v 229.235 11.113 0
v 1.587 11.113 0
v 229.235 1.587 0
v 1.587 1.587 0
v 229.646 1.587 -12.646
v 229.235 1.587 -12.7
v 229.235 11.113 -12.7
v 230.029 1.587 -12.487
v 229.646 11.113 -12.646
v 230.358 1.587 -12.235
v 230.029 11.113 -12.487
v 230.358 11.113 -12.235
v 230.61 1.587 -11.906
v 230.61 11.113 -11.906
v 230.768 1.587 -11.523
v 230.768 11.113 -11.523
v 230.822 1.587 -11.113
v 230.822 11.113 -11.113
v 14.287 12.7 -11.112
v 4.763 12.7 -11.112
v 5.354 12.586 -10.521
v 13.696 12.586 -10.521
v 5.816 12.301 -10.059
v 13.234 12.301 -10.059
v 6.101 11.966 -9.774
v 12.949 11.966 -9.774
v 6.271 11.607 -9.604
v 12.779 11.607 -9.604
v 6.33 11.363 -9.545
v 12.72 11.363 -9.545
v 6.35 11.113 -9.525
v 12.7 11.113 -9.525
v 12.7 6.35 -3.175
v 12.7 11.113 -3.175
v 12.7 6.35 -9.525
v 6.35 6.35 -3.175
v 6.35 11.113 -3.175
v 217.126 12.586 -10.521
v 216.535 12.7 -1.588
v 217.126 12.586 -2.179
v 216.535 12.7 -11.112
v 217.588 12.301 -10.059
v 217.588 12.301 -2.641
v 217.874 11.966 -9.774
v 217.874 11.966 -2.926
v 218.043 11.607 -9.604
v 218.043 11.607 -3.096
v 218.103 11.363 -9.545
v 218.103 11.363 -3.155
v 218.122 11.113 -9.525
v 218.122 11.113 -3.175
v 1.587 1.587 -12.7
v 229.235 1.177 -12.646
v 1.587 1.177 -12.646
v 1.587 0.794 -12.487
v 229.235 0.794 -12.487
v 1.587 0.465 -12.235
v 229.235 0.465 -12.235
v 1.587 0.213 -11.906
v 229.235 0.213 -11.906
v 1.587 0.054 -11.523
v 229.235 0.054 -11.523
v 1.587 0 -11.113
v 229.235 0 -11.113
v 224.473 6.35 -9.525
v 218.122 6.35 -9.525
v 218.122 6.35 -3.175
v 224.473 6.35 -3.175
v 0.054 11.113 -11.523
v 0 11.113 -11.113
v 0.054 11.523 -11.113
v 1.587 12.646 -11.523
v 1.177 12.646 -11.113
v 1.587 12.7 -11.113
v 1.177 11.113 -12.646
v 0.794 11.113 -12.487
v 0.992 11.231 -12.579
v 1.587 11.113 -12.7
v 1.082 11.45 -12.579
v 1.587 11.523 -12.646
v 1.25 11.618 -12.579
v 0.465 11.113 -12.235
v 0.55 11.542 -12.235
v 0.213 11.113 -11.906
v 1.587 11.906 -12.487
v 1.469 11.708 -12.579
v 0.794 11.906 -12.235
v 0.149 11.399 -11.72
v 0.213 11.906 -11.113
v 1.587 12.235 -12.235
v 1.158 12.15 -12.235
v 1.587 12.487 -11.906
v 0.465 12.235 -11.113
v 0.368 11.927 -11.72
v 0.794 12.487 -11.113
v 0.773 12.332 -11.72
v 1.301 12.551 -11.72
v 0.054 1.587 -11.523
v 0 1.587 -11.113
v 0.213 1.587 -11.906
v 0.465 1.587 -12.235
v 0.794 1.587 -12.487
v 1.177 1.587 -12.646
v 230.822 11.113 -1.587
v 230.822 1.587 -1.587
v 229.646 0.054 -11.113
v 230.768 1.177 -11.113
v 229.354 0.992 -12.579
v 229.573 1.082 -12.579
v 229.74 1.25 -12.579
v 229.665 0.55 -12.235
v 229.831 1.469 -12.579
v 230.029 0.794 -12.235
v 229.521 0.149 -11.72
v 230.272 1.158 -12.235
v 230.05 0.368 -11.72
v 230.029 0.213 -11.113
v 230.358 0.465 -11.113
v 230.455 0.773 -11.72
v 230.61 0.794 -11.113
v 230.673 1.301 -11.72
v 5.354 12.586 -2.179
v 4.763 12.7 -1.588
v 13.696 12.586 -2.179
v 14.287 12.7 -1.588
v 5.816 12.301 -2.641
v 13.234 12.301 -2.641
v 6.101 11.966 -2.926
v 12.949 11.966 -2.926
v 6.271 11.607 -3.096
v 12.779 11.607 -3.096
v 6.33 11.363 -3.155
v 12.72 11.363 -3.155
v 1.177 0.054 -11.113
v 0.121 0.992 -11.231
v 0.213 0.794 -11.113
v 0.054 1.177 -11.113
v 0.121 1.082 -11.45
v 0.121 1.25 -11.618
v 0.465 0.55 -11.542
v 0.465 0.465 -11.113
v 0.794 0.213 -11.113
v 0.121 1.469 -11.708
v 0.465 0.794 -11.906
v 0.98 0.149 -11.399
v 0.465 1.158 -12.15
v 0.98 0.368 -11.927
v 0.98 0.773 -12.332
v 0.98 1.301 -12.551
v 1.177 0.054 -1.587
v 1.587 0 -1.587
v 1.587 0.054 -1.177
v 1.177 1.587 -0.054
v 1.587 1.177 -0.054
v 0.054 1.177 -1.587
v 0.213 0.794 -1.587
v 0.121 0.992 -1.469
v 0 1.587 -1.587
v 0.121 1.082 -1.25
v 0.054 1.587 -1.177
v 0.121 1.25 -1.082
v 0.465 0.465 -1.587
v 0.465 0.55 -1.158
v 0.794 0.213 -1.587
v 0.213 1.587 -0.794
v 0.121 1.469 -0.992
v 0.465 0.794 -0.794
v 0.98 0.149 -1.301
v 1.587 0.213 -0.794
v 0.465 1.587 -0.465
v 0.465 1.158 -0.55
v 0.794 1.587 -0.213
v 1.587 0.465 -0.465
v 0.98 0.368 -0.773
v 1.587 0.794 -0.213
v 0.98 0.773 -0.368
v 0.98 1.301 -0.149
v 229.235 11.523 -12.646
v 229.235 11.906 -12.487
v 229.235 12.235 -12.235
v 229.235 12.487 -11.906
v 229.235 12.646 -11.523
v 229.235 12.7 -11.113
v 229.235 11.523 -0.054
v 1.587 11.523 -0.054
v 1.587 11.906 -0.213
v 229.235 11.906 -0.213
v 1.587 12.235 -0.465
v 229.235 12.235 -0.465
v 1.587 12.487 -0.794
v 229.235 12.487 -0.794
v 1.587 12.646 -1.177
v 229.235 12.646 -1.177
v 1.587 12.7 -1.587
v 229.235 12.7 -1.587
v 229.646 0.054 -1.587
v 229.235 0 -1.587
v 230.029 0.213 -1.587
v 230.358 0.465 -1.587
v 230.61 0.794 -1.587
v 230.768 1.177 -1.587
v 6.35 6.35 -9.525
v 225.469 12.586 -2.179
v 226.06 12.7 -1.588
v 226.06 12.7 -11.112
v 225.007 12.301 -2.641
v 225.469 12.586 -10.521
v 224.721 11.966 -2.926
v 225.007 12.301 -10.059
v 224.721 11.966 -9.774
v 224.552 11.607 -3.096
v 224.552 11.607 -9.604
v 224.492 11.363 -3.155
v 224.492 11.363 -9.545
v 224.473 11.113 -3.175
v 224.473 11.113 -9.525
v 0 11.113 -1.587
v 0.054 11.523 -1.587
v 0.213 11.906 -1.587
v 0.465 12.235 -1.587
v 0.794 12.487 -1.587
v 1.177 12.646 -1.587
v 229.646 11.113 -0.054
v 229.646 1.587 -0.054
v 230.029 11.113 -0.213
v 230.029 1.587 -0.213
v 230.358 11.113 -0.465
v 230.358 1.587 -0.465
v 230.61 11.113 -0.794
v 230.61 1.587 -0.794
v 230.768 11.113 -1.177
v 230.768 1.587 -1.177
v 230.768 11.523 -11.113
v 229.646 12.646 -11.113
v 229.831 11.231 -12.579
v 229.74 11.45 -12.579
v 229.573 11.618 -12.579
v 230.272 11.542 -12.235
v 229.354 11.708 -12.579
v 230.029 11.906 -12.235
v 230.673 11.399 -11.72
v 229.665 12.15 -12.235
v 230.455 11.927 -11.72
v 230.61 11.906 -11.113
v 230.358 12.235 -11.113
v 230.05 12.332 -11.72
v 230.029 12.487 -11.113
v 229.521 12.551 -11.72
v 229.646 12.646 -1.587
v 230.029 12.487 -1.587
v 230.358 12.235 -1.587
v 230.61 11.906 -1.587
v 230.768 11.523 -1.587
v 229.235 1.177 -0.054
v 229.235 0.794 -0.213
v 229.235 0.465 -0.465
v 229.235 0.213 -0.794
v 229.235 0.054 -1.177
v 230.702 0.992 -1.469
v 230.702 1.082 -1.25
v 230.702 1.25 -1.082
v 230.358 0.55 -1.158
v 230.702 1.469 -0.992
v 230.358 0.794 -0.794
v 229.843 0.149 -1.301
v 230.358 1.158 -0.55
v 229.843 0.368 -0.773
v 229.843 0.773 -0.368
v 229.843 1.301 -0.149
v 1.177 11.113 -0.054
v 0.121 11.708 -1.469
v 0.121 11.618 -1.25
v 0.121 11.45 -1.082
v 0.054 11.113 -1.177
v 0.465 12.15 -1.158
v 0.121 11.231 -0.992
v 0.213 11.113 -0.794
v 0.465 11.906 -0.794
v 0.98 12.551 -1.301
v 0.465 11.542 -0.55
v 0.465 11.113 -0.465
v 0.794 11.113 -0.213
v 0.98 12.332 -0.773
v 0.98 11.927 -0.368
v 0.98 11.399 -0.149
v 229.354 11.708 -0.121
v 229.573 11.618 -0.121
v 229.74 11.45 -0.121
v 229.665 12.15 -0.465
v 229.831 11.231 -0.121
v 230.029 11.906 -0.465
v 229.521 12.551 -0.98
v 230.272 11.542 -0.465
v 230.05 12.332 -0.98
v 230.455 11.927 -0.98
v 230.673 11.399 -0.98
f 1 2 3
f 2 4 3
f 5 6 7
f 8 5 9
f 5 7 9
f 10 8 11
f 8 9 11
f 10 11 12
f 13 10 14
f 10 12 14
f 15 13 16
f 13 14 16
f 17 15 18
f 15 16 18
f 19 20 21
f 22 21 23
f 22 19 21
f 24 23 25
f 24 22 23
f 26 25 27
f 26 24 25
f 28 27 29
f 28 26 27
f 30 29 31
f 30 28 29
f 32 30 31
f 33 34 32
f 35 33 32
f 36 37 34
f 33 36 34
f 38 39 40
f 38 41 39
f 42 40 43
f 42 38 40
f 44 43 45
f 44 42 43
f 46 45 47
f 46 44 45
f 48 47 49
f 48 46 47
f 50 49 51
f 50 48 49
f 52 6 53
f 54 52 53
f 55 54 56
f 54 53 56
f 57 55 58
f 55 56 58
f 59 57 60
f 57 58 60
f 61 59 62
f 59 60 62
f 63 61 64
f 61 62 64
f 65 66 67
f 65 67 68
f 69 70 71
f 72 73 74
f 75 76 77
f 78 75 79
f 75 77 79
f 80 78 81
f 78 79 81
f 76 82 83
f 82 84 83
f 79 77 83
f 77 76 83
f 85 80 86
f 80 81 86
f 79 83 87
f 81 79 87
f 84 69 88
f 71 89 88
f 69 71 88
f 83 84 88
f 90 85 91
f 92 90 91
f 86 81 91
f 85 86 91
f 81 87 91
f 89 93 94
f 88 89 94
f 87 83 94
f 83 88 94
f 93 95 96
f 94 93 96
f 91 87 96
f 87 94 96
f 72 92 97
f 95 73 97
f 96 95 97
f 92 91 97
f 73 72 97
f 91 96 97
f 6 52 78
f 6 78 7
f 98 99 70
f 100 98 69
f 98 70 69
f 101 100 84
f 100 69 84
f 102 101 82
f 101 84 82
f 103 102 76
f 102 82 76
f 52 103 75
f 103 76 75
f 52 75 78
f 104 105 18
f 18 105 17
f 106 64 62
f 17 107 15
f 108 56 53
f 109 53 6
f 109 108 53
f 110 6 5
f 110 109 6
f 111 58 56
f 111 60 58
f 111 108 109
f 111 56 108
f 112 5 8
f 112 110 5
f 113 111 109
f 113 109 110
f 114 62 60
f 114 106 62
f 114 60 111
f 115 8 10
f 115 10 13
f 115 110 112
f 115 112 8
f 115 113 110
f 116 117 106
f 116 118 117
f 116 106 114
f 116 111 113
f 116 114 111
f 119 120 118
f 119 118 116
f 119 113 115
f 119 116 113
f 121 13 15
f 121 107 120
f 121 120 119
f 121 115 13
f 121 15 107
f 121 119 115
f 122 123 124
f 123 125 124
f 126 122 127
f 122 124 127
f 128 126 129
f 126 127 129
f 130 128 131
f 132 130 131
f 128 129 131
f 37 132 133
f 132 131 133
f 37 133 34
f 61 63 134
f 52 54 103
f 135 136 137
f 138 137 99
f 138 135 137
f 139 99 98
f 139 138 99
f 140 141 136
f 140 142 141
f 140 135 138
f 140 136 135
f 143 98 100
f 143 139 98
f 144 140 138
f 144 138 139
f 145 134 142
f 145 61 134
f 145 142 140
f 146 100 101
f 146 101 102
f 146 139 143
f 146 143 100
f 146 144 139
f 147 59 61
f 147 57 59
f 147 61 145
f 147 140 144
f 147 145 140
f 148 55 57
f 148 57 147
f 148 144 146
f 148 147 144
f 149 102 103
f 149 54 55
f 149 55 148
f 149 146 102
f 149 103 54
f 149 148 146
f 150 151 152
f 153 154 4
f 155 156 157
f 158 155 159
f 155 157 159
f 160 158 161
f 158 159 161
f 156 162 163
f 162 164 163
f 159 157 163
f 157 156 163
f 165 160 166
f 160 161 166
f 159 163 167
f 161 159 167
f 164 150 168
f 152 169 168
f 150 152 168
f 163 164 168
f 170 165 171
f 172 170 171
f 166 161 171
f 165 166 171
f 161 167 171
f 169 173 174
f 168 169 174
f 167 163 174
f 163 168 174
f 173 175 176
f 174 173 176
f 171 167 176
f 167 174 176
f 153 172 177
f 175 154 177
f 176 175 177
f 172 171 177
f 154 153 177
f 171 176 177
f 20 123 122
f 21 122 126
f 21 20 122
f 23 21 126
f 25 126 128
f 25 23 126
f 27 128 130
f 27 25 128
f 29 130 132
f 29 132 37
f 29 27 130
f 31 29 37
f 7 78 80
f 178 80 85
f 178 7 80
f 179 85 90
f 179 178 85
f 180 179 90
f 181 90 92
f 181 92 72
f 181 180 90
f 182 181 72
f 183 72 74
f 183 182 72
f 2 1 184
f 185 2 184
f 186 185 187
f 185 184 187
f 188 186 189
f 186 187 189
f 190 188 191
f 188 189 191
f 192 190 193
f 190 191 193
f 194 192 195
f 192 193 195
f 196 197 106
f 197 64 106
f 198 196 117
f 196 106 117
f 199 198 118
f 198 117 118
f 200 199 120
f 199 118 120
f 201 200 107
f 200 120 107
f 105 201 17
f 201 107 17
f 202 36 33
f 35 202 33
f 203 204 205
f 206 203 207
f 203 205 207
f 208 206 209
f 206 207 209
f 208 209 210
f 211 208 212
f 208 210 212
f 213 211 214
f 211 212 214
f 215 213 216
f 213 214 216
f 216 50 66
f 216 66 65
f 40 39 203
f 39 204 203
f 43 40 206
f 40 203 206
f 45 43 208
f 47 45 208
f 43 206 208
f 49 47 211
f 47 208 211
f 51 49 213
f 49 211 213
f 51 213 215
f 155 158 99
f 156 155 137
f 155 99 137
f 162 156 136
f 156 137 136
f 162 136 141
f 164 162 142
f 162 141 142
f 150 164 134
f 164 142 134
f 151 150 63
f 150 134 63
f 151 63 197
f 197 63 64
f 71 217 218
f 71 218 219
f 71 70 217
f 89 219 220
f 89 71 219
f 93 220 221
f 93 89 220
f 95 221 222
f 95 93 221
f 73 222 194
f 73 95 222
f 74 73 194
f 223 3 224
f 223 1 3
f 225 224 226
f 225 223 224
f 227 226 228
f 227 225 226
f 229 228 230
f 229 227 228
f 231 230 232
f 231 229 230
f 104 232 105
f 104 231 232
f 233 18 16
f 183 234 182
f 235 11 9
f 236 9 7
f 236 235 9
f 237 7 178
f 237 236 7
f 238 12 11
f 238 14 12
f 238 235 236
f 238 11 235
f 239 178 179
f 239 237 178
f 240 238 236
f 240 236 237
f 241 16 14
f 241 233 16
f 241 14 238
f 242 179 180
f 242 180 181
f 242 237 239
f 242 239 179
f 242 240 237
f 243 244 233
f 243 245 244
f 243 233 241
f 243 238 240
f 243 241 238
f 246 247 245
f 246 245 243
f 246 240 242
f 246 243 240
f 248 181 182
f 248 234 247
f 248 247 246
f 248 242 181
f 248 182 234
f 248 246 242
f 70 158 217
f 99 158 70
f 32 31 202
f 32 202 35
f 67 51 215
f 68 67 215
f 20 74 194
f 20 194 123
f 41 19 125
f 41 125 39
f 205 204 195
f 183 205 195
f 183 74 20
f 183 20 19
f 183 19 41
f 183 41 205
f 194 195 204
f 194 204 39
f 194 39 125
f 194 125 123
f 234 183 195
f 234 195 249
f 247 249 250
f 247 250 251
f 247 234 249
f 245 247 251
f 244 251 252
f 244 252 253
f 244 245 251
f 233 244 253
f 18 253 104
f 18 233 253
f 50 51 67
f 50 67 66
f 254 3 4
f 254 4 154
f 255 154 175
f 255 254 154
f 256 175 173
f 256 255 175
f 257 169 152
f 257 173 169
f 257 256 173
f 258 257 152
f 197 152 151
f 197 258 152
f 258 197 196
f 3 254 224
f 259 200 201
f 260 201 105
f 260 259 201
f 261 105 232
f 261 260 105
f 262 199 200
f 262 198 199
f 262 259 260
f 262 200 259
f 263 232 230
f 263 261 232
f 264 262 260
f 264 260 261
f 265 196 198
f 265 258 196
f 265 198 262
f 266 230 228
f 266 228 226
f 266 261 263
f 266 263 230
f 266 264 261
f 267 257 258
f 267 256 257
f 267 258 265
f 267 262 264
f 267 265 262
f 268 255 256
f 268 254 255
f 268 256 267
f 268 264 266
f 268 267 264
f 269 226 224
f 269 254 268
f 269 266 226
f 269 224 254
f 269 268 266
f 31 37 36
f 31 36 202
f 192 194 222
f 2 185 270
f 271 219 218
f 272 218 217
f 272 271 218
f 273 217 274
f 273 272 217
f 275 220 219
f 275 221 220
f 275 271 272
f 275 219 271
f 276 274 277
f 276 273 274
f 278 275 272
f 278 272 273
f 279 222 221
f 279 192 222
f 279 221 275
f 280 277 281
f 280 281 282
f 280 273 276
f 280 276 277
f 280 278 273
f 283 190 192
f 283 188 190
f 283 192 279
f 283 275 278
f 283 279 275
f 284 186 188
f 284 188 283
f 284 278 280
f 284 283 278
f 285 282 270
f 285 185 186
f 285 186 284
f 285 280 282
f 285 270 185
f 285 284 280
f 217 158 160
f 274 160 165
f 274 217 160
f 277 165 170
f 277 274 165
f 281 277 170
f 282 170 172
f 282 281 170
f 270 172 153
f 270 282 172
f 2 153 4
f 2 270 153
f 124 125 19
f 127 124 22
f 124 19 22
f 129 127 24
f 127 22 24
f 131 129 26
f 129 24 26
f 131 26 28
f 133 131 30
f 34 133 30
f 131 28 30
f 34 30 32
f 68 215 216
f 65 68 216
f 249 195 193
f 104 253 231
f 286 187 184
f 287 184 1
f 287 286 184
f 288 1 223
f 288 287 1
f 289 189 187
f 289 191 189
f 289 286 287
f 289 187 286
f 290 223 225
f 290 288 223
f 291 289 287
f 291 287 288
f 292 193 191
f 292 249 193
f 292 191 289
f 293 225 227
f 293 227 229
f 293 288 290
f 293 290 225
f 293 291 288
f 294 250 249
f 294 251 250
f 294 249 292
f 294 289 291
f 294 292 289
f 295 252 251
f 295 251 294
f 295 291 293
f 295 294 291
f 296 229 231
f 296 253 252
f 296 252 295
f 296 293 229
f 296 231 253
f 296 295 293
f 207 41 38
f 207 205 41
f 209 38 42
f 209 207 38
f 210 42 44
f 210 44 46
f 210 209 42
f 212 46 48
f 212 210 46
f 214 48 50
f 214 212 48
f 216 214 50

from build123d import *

# Parameters (mm, degrees)
SKETCH1_W           = 230.8225
SKETCH1_H           = 12.7
BOSS_EXTRUDE1_DEPTH = 12.7
SKETCH2_W           = 6.35
SKETCH2_H           = 6.35
CUT_EXTRUDE1_DEPTH  = 6.35
FILLET1_R           = 1.5875


with BuildPart() as part:
    # Sketch1 → Boss-Extrude1 (new body)
    with BuildSketch(Plane(origin=(0, 0, 0), x_dir=(1, 0, 0), z_dir=(0, 1, 0))):
        with Locations((115.41125, 6.35)):
            Rectangle(SKETCH1_W, SKETCH1_H)
    extrude(amount=BOSS_EXTRUDE1_DEPTH)

    # Sketch2 → Cut-Extrude1 (cut)
    with BuildSketch(Plane(origin=(0, 12.7, 0), x_dir=(1, 0, 0), z_dir=(0, 1, 0))):
        with Locations((221.2975, 6.35)):
            Rectangle(SKETCH2_W, SKETCH2_H)
        with Locations((9.525, 6.35)):
            Rectangle(SKETCH2_W, SKETCH2_H)
    extrude(amount=-CUT_EXTRUDE1_DEPTH, mode=Mode.SUBTRACT)

    # Fillet1
    fillet1_edges = [part.edges().sort_by_distance(p)[0] for p in [
        (230.8225, 12.7, -6.35),
        (115.41125, 12.7, 0),
        (218.1225, 12.7, -6.35),
        (221.2975, 12.7, -3.175),
        (224.4725, 12.7, -6.35),
        (221.2975, 12.7, -9.525),
        (12.7, 12.7, -6.35),
        (9.525, 12.7, -9.525),
        (6.35, 12.7, -6.35),
        (9.525, 12.7, -3.175),
        (0, 12.7, -6.35),
        (115.41125, 0, 0),
        (230.8225, 0, -6.35),
        (115.41125, 0, -12.7),
        (0, 0, -6.35),
        (0, 6.35, 0),
        (230.8225, 6.35, 0),
        (230.8225, 6.35, -12.7),
        (0, 6.35, -12.7),
        (115.41125, 12.7, -12.7),
    ]]
    fillet(fillet1_edges, radius=FILLET1_R - 0.0001)  # a hair under: the kernel refuses the full size


solid = part.part
